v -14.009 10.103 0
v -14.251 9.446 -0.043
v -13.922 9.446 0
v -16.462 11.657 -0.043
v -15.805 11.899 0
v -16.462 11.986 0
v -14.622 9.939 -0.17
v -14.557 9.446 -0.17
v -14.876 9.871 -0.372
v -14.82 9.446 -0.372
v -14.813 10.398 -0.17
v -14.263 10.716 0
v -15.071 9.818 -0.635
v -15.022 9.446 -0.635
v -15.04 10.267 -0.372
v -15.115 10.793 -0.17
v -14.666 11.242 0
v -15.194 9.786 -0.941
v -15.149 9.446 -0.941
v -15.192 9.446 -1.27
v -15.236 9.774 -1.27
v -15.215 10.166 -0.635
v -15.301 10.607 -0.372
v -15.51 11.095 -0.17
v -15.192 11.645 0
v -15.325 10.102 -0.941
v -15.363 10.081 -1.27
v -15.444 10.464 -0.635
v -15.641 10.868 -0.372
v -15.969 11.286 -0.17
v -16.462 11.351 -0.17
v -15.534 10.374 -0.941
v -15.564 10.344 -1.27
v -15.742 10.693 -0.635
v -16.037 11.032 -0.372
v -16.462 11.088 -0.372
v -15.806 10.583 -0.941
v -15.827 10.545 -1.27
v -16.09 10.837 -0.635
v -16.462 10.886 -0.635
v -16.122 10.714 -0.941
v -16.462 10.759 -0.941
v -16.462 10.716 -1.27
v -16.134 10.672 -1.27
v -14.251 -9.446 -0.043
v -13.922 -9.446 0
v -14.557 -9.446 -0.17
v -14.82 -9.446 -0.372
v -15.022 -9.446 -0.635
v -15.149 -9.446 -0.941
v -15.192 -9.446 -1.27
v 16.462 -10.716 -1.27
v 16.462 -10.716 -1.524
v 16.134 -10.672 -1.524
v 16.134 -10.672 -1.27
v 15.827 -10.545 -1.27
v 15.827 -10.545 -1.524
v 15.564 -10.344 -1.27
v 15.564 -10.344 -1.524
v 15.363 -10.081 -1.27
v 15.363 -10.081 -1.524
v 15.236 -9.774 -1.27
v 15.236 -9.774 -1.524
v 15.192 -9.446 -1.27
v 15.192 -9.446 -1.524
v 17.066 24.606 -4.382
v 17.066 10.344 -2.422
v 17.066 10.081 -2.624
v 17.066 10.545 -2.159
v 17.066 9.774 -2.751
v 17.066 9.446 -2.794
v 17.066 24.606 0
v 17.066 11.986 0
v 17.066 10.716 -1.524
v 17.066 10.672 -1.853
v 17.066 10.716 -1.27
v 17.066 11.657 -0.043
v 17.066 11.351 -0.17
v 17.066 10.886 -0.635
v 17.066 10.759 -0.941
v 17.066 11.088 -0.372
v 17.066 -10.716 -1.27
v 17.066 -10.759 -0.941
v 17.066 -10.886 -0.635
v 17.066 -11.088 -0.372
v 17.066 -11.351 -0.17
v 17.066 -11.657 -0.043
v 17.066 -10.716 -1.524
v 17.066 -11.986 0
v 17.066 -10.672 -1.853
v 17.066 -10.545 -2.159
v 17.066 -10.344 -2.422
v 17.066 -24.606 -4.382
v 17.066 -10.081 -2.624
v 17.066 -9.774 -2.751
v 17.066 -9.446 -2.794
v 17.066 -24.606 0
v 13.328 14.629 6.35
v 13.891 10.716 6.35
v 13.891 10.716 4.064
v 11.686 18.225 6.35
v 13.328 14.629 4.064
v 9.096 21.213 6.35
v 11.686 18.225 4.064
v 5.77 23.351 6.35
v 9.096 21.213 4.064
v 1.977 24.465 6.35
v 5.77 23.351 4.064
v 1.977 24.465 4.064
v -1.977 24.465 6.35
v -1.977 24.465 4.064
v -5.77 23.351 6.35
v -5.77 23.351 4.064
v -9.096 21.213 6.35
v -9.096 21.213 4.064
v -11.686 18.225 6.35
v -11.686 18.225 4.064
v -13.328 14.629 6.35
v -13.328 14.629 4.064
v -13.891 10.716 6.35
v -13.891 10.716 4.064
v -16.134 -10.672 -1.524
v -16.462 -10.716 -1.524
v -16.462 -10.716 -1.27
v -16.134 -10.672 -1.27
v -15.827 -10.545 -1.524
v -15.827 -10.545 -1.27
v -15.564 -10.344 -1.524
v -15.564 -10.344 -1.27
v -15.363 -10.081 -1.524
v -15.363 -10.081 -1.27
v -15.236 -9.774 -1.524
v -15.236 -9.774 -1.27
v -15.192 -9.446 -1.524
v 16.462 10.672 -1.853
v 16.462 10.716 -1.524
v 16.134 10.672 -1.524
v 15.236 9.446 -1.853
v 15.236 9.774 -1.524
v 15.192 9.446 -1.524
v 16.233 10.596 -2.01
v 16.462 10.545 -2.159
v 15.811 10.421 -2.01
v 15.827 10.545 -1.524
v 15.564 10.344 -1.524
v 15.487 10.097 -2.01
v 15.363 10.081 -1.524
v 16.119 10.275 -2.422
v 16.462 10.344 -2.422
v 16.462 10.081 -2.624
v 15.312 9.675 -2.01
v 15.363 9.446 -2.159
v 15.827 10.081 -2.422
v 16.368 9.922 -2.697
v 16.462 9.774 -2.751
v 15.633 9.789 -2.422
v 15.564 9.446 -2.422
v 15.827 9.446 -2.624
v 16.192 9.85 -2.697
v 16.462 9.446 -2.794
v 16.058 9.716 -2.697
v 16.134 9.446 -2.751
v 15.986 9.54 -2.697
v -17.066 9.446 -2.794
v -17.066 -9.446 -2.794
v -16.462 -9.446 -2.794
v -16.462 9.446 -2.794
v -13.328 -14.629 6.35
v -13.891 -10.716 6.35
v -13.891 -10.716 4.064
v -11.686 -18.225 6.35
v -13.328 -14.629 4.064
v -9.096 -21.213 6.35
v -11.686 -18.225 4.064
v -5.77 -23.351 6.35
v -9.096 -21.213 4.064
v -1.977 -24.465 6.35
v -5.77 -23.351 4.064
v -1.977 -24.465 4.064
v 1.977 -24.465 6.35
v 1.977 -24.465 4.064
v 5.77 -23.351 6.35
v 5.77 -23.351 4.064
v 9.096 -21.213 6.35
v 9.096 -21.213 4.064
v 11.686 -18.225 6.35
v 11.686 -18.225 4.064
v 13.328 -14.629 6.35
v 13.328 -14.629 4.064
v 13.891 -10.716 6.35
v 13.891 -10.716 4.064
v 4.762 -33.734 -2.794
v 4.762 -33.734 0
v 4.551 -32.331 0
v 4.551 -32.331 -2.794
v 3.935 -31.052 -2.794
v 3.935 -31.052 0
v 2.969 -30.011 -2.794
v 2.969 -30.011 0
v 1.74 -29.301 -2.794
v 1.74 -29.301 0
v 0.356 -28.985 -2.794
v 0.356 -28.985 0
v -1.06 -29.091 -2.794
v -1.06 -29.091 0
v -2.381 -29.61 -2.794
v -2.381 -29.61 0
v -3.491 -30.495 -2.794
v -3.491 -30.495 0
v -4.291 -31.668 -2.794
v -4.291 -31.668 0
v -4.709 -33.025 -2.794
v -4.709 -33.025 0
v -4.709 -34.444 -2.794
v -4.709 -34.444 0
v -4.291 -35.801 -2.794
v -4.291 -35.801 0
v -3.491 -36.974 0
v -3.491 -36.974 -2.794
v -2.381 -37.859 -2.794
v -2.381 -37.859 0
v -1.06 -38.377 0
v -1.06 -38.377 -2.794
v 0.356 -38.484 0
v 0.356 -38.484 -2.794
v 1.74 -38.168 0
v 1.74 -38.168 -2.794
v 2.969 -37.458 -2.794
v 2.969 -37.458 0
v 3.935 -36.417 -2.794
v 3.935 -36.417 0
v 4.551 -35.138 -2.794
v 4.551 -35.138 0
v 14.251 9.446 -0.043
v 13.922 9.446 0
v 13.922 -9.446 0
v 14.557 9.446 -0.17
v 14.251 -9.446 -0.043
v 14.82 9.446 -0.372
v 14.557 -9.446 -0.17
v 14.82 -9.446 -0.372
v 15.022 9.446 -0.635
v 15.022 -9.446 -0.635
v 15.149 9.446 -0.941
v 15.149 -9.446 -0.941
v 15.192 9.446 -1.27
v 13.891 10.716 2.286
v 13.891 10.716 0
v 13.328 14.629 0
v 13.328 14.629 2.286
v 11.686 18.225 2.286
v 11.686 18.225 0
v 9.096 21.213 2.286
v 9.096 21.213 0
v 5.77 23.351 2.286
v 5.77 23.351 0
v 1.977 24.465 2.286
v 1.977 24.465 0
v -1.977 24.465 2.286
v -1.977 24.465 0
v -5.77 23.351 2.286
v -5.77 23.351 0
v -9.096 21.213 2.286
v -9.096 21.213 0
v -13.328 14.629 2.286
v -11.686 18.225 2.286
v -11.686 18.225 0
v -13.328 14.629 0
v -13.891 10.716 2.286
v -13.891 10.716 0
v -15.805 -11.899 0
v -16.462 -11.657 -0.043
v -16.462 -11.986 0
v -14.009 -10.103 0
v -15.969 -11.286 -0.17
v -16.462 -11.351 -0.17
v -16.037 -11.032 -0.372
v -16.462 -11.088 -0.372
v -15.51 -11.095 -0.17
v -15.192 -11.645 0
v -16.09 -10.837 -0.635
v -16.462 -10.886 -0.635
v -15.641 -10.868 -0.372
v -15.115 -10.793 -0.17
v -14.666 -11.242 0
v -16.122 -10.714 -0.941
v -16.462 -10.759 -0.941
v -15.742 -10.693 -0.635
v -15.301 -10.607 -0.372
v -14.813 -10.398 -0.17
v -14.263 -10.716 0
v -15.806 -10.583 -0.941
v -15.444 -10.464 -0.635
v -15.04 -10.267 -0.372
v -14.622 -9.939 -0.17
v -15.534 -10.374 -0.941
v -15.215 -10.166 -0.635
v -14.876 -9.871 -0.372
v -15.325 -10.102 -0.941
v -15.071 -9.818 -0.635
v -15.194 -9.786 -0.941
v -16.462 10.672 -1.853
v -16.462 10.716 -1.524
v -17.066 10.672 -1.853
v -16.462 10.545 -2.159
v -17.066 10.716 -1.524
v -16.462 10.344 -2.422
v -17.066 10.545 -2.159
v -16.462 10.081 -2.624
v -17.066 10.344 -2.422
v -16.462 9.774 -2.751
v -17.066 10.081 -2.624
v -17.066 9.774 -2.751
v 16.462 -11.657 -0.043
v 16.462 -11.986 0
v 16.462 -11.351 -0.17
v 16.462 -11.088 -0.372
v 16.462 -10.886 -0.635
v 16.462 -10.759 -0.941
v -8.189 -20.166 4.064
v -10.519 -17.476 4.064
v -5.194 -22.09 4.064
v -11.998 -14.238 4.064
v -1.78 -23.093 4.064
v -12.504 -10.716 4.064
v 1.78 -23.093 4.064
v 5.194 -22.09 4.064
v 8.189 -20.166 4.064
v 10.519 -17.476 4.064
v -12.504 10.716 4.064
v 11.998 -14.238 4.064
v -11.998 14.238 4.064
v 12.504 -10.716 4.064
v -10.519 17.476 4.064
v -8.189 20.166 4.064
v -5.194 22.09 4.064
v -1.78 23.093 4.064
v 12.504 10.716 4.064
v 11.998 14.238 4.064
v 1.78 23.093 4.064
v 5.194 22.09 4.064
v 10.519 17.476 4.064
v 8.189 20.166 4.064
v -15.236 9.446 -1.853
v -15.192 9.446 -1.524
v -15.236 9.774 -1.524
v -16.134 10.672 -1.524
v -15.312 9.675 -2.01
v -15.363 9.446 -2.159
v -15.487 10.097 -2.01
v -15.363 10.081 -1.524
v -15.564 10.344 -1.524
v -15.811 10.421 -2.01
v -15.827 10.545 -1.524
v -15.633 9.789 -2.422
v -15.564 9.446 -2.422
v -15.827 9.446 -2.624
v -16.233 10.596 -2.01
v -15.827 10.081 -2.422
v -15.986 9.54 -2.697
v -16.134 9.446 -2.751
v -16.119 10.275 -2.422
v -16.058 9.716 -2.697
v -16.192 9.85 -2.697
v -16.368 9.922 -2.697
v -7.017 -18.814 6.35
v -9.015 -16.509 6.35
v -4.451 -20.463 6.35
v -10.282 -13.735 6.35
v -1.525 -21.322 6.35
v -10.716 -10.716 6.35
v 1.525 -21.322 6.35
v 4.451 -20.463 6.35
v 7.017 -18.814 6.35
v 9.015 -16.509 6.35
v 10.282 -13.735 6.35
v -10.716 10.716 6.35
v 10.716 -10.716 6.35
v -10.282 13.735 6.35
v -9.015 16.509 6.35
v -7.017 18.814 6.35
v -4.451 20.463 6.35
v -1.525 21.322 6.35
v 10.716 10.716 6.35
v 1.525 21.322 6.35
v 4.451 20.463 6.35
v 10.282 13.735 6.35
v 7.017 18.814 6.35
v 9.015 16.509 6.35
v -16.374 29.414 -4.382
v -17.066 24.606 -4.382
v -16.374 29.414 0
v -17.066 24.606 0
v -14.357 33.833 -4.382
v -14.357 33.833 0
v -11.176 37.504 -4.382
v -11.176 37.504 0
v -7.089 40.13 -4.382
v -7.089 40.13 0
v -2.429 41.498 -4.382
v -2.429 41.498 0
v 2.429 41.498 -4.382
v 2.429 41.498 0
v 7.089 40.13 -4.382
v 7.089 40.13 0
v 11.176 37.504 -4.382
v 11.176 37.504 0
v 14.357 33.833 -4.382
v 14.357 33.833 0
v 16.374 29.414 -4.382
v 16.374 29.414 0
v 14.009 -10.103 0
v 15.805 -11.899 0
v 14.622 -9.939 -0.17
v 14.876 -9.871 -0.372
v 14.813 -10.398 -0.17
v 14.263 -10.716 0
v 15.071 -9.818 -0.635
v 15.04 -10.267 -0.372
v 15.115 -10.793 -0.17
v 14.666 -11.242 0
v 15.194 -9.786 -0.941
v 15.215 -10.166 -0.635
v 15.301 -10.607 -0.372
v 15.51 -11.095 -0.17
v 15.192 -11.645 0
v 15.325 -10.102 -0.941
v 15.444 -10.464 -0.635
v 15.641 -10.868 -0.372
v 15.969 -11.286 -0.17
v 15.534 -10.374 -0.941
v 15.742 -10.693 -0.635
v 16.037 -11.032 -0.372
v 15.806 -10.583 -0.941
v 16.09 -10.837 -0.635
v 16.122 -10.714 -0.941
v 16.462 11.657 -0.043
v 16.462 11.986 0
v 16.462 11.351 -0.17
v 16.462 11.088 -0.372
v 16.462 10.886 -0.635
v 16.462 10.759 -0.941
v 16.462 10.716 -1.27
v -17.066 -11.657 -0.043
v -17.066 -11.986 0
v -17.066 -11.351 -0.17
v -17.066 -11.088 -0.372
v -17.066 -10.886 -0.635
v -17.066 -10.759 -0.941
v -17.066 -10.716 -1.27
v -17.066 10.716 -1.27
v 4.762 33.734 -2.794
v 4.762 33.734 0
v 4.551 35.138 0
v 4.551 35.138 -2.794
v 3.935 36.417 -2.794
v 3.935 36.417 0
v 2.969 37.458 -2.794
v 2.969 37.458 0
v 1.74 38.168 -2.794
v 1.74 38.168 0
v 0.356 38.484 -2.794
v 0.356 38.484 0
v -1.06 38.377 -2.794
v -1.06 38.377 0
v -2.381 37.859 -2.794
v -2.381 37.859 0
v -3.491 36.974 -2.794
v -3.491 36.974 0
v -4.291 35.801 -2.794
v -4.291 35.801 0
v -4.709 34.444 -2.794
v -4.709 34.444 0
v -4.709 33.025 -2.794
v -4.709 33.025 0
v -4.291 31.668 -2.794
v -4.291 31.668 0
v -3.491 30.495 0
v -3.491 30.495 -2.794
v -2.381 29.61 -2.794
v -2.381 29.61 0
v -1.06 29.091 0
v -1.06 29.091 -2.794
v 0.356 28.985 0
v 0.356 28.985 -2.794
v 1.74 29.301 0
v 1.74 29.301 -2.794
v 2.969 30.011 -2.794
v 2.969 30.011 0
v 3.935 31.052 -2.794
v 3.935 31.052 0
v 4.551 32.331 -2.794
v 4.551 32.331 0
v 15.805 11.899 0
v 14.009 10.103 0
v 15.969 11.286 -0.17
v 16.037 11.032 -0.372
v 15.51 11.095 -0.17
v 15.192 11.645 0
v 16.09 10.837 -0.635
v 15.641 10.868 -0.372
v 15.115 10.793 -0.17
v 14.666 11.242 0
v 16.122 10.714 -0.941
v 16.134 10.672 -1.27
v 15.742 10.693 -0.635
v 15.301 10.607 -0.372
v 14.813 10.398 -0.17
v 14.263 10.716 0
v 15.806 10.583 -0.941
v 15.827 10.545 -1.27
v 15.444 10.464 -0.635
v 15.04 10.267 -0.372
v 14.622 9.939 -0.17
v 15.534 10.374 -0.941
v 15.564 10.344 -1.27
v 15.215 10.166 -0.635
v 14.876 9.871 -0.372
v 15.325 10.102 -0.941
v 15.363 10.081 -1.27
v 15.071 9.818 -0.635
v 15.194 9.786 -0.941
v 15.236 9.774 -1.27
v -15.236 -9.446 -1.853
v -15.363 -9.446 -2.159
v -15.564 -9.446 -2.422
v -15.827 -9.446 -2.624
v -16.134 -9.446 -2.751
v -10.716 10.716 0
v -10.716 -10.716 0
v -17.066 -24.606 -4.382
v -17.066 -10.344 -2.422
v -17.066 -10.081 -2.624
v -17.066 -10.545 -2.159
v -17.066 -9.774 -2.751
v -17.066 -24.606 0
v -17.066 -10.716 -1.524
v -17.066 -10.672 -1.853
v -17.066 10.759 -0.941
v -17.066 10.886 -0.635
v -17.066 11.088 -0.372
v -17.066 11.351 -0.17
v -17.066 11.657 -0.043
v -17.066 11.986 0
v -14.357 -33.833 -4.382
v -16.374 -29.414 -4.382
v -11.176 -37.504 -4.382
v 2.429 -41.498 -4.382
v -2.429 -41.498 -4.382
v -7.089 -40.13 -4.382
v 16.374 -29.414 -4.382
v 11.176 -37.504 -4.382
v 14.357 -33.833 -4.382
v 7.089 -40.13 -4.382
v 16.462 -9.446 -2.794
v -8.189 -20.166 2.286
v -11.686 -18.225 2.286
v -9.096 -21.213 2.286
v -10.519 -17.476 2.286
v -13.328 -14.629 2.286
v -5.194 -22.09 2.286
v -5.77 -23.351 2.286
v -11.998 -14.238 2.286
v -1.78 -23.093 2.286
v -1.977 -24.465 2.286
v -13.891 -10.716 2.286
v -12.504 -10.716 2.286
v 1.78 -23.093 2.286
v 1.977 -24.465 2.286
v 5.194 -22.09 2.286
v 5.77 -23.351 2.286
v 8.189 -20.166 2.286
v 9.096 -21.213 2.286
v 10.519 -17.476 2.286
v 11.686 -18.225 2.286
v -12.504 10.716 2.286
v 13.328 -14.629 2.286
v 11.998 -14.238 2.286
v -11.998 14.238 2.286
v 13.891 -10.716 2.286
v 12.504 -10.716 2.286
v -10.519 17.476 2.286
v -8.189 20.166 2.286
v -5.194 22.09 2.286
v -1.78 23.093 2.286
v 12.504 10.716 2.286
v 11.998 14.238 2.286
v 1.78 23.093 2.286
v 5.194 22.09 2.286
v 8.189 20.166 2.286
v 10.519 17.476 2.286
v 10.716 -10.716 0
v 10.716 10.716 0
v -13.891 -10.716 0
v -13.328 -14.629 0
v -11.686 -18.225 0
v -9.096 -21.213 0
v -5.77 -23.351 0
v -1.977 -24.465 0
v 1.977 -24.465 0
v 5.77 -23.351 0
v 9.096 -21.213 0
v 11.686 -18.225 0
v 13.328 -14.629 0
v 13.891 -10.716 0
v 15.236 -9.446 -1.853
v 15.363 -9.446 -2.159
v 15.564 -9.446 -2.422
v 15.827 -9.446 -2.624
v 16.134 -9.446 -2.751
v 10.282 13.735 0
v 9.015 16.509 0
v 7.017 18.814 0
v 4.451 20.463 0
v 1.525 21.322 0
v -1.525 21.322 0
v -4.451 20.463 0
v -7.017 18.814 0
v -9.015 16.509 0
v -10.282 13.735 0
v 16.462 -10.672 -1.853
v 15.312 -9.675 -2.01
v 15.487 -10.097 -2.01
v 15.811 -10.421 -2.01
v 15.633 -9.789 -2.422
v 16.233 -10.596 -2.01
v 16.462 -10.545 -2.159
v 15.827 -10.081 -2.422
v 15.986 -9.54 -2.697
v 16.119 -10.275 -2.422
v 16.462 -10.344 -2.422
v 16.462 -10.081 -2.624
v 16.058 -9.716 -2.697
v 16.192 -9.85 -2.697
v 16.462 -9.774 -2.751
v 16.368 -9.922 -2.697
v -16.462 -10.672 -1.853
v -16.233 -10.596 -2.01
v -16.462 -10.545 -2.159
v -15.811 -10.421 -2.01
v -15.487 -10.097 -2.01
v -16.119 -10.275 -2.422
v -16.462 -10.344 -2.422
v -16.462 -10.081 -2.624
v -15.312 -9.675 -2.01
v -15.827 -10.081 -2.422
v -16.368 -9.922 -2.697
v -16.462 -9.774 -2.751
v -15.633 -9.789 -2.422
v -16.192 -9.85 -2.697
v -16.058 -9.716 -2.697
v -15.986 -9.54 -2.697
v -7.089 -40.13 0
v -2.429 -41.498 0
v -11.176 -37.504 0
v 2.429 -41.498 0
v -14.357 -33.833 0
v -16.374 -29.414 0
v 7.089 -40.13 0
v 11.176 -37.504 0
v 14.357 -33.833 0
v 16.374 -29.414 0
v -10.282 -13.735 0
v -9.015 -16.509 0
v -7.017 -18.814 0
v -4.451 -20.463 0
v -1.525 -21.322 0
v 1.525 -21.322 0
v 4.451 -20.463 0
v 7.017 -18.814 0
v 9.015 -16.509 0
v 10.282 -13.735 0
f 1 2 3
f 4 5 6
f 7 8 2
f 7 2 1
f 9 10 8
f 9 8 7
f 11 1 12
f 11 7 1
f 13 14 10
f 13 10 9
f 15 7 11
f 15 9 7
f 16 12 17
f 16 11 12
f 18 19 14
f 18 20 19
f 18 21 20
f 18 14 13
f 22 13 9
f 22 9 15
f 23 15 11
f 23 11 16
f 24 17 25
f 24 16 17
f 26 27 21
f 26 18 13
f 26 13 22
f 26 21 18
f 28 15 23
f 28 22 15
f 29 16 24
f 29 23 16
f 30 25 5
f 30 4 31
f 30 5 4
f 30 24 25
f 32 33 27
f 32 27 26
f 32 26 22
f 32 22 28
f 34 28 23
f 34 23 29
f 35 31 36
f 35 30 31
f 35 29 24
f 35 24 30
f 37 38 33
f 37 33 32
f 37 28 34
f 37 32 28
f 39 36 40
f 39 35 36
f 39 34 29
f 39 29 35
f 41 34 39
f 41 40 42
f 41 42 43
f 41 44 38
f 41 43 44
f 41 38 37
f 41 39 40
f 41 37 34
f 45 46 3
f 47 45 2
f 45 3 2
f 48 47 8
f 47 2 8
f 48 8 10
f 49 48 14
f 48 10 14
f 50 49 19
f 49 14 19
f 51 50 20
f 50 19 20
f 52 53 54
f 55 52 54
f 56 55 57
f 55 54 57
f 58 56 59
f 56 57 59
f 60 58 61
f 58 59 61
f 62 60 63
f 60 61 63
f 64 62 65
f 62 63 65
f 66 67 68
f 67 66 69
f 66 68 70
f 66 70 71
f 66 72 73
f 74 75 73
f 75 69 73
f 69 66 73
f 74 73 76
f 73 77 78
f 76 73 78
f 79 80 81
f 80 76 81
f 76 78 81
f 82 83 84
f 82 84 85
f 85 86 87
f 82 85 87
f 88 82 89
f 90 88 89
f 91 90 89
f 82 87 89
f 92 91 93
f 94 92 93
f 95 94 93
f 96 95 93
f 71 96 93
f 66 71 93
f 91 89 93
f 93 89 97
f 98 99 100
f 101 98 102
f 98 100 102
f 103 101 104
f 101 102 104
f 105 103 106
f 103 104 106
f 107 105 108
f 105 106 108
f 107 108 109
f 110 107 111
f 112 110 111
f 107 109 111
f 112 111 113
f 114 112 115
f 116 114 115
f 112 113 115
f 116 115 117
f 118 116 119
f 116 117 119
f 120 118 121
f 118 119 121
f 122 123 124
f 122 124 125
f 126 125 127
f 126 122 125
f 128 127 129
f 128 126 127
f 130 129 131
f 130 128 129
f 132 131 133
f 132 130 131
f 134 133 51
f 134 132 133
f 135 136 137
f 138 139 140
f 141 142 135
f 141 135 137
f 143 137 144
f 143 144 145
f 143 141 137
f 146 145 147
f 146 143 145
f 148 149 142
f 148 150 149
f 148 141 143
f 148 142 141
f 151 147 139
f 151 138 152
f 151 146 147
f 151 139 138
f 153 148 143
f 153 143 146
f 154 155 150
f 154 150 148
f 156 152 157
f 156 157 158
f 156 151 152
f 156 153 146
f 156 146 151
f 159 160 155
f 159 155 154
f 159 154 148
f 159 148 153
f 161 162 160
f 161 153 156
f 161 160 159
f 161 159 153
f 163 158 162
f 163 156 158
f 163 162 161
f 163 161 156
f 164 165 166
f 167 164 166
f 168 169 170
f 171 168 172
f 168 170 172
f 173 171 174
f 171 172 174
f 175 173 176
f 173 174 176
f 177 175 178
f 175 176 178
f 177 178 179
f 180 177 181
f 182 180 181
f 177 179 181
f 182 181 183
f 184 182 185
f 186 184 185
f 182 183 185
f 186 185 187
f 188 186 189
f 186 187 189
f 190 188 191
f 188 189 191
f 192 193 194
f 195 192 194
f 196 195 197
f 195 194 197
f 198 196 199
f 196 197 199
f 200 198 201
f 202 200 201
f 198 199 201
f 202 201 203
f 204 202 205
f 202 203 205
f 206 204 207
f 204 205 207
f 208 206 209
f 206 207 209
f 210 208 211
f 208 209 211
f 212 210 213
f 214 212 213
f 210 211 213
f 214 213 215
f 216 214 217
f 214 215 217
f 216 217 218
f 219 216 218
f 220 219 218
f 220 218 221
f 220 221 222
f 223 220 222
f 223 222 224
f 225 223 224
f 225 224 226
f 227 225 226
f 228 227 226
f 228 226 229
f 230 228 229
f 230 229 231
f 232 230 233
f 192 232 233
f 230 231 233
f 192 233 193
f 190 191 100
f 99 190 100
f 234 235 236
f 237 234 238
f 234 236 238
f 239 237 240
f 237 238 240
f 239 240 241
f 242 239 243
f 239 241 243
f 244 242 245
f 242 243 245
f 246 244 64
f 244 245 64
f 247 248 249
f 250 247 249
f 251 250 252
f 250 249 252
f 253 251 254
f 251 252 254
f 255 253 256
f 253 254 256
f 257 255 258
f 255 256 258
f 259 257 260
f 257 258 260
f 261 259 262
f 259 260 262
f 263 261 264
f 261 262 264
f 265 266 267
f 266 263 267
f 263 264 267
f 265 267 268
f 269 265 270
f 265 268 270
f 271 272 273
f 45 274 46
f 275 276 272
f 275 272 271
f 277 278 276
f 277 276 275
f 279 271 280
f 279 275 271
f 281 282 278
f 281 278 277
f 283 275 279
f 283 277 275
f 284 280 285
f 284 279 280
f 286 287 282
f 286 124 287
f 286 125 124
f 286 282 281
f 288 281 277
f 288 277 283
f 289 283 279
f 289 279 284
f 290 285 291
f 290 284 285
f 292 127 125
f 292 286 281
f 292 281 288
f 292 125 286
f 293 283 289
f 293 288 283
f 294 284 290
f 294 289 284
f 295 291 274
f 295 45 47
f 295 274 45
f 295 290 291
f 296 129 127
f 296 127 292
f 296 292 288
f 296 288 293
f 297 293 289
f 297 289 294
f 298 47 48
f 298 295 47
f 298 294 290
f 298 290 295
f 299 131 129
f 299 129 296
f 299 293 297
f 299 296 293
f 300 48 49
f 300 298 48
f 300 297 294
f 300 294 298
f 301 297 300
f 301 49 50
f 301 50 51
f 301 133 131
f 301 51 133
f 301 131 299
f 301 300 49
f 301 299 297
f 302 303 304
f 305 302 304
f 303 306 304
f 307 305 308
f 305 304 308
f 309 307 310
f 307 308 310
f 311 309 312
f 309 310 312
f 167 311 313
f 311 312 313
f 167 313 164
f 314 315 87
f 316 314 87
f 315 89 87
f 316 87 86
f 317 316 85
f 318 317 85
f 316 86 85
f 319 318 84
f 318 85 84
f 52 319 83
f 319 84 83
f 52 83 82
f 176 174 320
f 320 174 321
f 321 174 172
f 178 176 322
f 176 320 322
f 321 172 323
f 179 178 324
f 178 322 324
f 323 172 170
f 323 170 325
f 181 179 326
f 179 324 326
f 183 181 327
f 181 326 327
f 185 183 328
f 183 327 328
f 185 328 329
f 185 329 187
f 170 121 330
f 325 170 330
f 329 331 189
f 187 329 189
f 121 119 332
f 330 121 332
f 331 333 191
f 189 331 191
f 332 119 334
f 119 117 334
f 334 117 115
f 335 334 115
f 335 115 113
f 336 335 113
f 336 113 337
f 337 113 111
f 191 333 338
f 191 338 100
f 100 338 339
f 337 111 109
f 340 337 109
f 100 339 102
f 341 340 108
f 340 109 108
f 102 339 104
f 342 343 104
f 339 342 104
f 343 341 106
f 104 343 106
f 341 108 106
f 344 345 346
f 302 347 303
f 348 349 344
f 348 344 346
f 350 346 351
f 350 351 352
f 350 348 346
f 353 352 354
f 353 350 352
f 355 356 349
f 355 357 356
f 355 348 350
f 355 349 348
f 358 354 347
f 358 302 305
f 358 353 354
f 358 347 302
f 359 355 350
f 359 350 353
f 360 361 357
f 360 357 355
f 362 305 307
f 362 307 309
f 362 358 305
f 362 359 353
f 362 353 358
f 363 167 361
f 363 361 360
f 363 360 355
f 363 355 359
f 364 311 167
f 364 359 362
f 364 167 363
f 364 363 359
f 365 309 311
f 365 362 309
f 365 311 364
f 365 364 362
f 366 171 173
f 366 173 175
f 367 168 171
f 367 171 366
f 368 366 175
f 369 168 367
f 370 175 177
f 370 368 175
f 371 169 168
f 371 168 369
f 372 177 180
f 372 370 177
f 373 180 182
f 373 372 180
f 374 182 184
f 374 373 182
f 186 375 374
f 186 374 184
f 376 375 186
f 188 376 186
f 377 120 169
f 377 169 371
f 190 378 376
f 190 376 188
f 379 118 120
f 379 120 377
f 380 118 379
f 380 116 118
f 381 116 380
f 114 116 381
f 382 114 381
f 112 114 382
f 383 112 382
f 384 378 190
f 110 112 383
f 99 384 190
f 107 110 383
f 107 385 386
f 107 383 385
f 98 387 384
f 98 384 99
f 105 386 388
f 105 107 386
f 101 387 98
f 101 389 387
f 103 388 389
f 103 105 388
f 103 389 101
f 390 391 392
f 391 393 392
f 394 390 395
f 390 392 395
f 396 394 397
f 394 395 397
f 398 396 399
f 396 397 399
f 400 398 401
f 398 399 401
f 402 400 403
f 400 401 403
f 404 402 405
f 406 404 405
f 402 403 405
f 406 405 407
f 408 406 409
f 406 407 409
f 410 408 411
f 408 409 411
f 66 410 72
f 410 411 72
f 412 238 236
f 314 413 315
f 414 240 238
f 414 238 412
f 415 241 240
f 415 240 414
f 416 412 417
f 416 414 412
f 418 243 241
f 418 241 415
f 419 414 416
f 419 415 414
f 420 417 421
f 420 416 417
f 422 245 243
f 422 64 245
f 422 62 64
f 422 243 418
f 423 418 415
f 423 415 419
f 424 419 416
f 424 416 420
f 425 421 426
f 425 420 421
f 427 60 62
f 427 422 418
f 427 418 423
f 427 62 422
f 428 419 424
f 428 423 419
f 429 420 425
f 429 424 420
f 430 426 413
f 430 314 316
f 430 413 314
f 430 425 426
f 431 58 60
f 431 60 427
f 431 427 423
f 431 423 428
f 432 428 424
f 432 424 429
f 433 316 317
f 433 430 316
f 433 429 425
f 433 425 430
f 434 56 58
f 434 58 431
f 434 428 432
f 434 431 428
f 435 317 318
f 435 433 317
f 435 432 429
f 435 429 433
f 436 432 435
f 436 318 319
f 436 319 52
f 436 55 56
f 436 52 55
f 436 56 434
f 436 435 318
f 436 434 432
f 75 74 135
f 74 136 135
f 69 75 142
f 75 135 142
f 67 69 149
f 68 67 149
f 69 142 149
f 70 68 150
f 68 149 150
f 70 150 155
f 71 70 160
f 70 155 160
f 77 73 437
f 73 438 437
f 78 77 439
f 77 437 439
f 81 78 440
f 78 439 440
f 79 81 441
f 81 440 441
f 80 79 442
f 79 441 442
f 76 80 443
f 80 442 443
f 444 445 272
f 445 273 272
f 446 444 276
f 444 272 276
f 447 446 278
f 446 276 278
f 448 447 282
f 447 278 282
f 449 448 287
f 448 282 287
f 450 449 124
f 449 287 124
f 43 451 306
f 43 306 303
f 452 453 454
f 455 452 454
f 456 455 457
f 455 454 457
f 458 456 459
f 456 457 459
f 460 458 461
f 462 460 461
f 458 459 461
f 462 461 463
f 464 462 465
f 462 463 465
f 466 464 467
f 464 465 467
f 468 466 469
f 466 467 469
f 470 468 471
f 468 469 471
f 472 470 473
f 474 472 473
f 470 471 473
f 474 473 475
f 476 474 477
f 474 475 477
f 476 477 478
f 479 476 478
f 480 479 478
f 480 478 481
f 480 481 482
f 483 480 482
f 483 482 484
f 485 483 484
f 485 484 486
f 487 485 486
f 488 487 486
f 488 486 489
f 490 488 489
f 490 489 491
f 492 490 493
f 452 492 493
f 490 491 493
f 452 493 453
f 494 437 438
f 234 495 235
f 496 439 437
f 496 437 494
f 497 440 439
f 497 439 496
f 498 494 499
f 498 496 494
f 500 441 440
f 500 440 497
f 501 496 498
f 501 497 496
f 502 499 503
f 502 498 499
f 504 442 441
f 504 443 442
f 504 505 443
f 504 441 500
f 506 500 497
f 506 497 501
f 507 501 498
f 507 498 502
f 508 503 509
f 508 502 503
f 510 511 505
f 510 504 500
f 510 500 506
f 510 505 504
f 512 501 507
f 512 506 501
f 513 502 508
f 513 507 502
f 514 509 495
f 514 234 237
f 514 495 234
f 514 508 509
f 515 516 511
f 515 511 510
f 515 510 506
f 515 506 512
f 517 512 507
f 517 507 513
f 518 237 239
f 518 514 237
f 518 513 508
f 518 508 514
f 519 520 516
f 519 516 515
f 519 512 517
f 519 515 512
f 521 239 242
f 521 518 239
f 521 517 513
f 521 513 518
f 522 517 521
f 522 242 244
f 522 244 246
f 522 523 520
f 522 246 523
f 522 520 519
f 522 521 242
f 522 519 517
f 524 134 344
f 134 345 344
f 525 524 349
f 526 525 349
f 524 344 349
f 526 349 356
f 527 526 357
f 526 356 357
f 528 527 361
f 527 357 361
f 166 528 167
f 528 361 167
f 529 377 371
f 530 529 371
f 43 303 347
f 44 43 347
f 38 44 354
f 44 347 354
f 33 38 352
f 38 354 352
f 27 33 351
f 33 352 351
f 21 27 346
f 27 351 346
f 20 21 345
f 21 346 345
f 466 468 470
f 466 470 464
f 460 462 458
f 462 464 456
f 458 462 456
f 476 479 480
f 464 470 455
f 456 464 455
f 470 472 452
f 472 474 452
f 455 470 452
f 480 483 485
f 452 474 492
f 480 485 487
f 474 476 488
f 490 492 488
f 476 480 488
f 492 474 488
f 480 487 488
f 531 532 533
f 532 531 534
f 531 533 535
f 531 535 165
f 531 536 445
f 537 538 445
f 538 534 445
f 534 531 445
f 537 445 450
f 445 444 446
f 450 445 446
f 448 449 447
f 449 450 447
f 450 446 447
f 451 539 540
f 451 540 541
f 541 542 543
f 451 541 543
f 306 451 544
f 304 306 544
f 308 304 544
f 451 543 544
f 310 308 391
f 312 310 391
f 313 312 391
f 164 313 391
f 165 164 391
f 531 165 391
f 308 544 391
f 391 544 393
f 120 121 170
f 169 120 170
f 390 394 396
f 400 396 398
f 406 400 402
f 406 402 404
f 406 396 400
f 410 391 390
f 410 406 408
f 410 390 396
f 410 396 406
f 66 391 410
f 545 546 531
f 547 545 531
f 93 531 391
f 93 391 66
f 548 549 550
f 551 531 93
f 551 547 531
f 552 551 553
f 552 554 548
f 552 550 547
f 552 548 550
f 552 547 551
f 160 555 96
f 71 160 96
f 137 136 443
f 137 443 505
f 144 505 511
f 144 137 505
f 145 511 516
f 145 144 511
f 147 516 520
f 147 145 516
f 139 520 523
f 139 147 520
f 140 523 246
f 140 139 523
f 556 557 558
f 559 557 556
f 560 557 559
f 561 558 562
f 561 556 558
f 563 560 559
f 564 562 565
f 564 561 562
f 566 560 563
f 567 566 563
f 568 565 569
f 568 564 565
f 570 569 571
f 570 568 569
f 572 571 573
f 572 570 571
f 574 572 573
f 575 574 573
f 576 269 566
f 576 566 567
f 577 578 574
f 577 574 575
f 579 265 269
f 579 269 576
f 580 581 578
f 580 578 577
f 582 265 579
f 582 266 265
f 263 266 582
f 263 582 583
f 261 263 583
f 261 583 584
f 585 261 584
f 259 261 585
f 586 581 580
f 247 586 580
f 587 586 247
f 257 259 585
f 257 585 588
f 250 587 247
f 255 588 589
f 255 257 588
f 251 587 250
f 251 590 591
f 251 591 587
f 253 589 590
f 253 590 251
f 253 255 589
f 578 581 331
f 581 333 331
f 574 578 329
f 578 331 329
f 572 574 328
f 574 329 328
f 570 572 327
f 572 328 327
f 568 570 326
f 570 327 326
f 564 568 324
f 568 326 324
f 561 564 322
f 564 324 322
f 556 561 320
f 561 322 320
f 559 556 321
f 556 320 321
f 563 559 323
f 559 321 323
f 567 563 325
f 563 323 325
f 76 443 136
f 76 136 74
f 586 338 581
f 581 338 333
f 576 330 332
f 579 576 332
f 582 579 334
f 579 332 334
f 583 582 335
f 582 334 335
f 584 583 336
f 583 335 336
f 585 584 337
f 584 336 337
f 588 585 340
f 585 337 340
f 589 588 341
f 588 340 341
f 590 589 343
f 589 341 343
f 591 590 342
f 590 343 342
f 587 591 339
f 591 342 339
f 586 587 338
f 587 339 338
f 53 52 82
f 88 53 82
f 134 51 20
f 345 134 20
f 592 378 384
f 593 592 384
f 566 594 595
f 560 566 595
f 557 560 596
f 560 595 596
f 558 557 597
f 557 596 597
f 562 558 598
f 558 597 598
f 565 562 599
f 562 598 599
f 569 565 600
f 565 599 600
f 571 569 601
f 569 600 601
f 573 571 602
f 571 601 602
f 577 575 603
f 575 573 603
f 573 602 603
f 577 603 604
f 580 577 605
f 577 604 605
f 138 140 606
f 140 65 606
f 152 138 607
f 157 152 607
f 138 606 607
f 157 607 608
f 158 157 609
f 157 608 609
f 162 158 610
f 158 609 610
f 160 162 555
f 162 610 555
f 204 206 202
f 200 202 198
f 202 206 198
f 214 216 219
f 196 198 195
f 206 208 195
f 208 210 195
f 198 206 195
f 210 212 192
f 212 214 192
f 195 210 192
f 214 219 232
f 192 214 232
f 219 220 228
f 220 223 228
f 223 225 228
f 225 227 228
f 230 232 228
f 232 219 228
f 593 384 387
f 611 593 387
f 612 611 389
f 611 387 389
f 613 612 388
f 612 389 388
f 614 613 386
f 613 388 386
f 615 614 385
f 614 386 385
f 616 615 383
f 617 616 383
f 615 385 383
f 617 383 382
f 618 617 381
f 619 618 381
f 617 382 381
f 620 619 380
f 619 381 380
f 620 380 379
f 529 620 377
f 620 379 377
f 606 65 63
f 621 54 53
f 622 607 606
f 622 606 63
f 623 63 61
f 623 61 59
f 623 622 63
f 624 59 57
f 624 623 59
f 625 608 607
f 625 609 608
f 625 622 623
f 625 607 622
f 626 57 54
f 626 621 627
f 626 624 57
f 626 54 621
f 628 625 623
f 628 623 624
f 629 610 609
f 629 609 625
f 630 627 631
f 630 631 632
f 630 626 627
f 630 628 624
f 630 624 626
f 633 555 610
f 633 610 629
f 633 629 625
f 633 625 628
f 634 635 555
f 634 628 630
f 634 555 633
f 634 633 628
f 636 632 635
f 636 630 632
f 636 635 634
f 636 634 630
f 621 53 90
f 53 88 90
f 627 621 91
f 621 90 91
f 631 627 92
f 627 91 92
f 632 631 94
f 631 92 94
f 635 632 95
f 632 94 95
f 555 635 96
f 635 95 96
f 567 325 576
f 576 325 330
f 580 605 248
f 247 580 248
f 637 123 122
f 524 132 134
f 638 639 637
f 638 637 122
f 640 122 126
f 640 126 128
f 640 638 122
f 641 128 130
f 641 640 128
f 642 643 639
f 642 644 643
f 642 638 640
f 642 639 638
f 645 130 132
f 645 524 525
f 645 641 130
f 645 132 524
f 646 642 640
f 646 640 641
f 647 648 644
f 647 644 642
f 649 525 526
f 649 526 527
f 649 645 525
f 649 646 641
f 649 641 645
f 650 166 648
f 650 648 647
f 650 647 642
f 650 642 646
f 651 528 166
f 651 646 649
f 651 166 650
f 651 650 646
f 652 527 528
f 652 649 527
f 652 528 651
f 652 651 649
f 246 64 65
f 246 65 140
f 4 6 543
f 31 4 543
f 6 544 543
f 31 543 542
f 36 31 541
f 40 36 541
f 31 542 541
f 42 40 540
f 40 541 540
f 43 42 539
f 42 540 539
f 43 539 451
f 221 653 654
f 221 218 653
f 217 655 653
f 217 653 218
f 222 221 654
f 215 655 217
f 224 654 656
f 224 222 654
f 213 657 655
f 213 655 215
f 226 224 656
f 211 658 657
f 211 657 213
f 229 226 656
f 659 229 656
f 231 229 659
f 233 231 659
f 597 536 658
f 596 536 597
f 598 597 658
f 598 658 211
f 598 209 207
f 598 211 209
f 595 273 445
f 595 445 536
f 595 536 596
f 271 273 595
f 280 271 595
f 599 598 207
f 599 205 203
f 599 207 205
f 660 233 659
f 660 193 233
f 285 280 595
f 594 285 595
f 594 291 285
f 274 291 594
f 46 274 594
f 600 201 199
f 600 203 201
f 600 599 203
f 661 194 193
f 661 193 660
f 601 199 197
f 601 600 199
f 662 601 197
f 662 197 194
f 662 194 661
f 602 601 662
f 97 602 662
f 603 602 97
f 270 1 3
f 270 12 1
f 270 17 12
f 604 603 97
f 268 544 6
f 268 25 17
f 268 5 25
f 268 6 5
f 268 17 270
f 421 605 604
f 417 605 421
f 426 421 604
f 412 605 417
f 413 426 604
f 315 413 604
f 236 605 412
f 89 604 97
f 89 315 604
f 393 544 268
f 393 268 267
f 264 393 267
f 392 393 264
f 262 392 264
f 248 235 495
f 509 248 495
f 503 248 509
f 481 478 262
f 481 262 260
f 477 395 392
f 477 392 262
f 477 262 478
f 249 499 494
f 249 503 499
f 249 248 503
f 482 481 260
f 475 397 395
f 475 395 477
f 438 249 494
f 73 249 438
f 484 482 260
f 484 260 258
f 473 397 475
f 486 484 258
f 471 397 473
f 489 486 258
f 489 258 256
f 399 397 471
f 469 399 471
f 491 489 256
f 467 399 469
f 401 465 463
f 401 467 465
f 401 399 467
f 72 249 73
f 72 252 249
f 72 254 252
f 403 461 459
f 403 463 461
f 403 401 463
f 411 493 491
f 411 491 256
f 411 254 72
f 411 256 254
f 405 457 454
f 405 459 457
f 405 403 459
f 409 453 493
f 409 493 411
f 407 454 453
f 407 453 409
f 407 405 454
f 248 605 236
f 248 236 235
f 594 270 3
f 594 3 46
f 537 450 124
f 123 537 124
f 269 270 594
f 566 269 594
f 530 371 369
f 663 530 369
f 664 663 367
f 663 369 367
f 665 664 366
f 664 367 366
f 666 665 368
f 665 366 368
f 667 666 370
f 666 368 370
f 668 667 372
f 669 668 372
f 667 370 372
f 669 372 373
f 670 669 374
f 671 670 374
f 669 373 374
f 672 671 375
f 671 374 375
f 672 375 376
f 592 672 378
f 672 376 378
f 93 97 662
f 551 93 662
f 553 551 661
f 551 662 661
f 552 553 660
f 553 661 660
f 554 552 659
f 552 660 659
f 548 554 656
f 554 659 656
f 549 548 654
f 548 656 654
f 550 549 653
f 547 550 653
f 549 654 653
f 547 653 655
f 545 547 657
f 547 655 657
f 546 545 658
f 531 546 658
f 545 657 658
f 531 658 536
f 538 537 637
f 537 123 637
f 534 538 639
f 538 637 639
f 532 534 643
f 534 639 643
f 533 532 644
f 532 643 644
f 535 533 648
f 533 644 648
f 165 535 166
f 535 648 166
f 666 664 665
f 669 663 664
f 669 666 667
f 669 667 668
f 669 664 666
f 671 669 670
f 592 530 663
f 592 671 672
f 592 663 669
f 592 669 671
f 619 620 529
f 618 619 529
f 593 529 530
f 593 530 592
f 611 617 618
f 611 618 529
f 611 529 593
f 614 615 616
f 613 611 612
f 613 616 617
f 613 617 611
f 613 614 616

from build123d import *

# Parameters (mm, degrees)
F1_DEPTH  = 6.35
F0_R      = 4.7625
F2_DEPTH  = 2.794
F4_DEPTH  = 1.5875
F6_DEPTH  = 6.35
F8_W      = 1.87325
F8_H      = 21.43125
F9_DEPTH  = 2.794
F11_DEPTH = 0.889
F12_R     = 1.27
F13_R     = 1.27


with BuildPart() as f1:
    # F0 (on Top) → F1 (new body)
    with BuildSketch(Plane.XY):
        with BuildLine():
            ThreePointArc((13.890625, 10.715625), (0, 24.60625), (-13.890625, 10.715625))
            Line((-13.890625, 10.715625), (-13.890625, -10.715625))
            ThreePointArc((-13.890625, -10.715625), (0, -24.60625), (13.890625, -10.715625))
            Line((13.890625, -10.715625), (13.890625, 10.715625))
        make_face()
    extrude(amount=F1_DEPTH)

    # F0 (on Top) → F2 (join)
    with BuildSketch(Plane.XY):
        with BuildLine():
            ThreePointArc((17.065625, 24.60625), (0, 41.671875), (-17.065625, 24.60625))
            Line((-17.065625, 24.60625), (-17.065625, -24.60625))
            ThreePointArc((-17.065625, -24.60625), (0, -41.671875), (17.065625, -24.60625))
            Line((17.065625, -24.60625), (17.065625, 24.60625))
        make_face()
        with Locations((0, -33.734375)):
            Circle(F0_R, mode=Mode.SUBTRACT)
        with BuildLine():
            ThreePointArc((-14.684375, 10.715625), (0, 25.4), (14.684375, 10.715625))
            Line((14.684375, 10.715625), (14.684375, -10.715625))
            ThreePointArc((14.684375, -10.715625), (0, -25.4), (-14.684375, -10.715625))
            Line((-14.684375, -10.715625), (-14.684375, 10.715625))
        make_face(mode=Mode.SUBTRACT)
        with Locations((0, 33.734375)):
            Circle(F0_R, mode=Mode.SUBTRACT)
        with BuildLine():
            Line((14.684375, -10.715625), (14.684375, 10.715625))
            ThreePointArc((14.684375, 10.715625), (0, 25.4), (-14.684375, 10.715625))
            Line((-14.684375, 10.715625), (-14.684375, -10.715625))
            ThreePointArc((-14.684375, -10.715625), (0, -25.4), (14.684375, -10.715625))
        make_face()
        with BuildLine():
            Line((-13.890625, -10.715625), (-13.890625, 10.715625))
            ThreePointArc((-13.890625, 10.715625), (0, 24.60625), (13.890625, 10.715625))
            Line((13.890625, 10.715625), (13.890625, -10.715625))
            ThreePointArc((13.890625, -10.715625), (0, -24.60625), (-13.890625, -10.715625))
        make_face(mode=Mode.SUBTRACT)
        with BuildLine():
            ThreePointArc((13.890625, 10.715625), (0, 24.60625), (-13.890625, 10.715625))
            Line((-13.890625, 10.715625), (-13.890625, -10.715625))
            ThreePointArc((-13.890625, -10.715625), (0, -24.60625), (13.890625, -10.715625))
            Line((13.890625, -10.715625), (13.890625, 10.715625))
        make_face()
    extrude(amount=-F2_DEPTH)

    # F3 (on face) → F4 (join)
    with BuildSketch(Plane(origin=(0, 0, -2.794), x_dir=(1, 0, 0), z_dir=(0, 0, -1))):
        with BuildLine():
            ThreePointArc((17.065625, 24.60625), (0, 41.671875), (-17.065625, 24.60625))
            Line((-17.065625, 24.60625), (-17.065625, -24.60625))
            ThreePointArc((-17.065625, -24.60625), (0, -41.671875), (17.065625, -24.60625))
            Line((17.065625, -24.60625), (17.065625, 24.60625))
        make_face()
    extrude(amount=F4_DEPTH)

    # F5 (on face) → F6 (cut, through all)
    with BuildSketch(Plane.XY.offset(6.35)):
        with BuildLine():
            ThreePointArc((10.715625, 10.715625), (0, 21.43125), (-10.715625, 10.715625))
            Line((-10.715625, 10.715625), (-10.715625, -10.715625))
            ThreePointArc((-10.715625, -10.715625), (0, -21.43125), (10.715625, -10.715625))
            Line((10.715625, -10.715625), (10.715625, 10.715625))
        make_face()
    extrude(amount=-F6_DEPTH, mode=Mode.SUBTRACT)

    # F8 (on face) → F9 (cut, through all)
    with BuildSketch(Plane.XY):
        with Locations((16.129, 0)):
            Rectangle(F8_W, F8_H)
        with Locations((-16.129, 0)):
            Rectangle(F8_W, F8_H)
    extrude(amount=-F9_DEPTH, mode=Mode.SUBTRACT)

    # F10 (on mid) → F11 (cut, symmetric)
    with BuildSketch(Plane.XY.offset(3.175)):
        with BuildLine():
            Line((14.684375, -10.715625), (14.684375, 10.715625))
            ThreePointArc((14.684375, 10.715625), (0, 25.4), (-14.684375, 10.715625))
            Line((-14.684375, 10.715625), (-14.684375, -10.715625))
            ThreePointArc((-14.684375, -10.715625), (0, -25.4), (14.684375, -10.715625))
        make_face()
        with BuildLine():
            ThreePointArc((-12.5042083333, 10.715625), (0, 23.2198333333), (12.5042083333, 10.715625))
            Line((12.5042083333, 10.715625), (12.5042083333, -10.715625))
            ThreePointArc((12.5042083333, -10.715625), (0, -23.2198333333), (-12.5042083333, -10.715625))
            Line((-12.5042083333, -10.715625), (-12.5042083333, 10.715625))
        make_face(mode=Mode.SUBTRACT)
    extrude(amount=F11_DEPTH, both=True, mode=Mode.SUBTRACT)

    # F12
    f12_edges = [f1.edges().sort_by_distance(p)[0] for p in [
        (15.192375, -10.715625, -1.397),
        (15.192375, 10.715625, -1.397),
        (-15.192375, 10.715625, -1.397),
        (-15.192375, -10.715625, -1.397),
    ]]
    fillet(f12_edges, radius=F12_R)

    # F13
    f13_edges = [f1.edges().sort_by_distance(p)[0] for p in [
        (16.764, -10.715625, 0),
        (16.764, 10.715625, 0),
        (16.764, -10.715625, -2.794),
        (16.764, 10.715625, -2.794),
        (-16.764, -10.715625, 0),
        (-16.764, -10.715625, -2.794),
        (-16.764, 10.715625, 0),
        (-16.764, 10.715625, -2.794),
    ]]
    fillet(f13_edges, radius=F13_R)


solid = f1.part
